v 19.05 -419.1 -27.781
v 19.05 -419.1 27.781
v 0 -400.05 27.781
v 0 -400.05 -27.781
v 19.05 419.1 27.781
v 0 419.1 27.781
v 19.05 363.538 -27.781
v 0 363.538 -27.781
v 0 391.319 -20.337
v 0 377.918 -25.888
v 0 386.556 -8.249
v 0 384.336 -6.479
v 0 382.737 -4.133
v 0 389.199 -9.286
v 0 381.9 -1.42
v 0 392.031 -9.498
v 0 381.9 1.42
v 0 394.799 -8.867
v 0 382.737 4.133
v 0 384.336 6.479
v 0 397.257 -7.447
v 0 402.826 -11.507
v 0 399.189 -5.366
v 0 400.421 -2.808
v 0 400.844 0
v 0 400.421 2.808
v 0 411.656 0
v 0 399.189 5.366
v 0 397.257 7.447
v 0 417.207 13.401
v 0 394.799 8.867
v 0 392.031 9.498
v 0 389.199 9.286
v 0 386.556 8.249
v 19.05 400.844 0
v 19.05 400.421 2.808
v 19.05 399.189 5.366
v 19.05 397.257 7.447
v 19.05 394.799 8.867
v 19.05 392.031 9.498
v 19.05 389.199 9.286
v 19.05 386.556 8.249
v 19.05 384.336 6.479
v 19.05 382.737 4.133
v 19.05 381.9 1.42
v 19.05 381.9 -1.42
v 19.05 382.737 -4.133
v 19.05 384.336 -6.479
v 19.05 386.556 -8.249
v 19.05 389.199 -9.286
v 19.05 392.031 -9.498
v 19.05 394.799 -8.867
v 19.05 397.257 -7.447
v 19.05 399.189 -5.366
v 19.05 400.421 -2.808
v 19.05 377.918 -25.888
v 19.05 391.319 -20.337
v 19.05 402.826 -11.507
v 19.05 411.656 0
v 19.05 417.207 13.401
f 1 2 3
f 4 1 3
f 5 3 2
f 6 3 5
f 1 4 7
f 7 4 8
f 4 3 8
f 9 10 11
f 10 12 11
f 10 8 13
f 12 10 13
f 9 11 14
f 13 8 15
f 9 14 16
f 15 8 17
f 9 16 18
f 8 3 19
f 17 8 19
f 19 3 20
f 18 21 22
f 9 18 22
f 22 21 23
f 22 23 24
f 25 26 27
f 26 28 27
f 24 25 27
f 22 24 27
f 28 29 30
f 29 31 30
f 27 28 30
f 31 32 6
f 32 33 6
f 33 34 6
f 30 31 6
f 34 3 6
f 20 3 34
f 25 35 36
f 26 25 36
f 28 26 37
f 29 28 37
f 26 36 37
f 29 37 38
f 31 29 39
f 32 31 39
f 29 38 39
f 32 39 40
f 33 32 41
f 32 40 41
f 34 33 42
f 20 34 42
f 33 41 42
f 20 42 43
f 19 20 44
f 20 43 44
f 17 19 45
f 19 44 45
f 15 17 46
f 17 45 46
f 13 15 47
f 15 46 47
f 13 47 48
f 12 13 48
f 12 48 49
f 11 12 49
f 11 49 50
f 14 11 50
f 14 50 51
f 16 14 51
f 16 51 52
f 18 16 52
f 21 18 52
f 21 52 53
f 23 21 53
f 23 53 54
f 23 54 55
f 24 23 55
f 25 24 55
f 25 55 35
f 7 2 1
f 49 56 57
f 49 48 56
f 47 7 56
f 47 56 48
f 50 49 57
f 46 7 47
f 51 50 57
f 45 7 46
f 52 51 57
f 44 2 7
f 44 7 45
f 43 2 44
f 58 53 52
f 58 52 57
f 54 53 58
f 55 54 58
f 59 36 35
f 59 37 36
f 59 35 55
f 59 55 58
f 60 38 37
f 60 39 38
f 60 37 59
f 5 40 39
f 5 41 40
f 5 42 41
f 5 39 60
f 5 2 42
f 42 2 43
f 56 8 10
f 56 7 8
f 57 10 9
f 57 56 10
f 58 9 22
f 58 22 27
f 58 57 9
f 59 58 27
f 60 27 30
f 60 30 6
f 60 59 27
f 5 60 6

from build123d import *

# Parameters (mm, degrees)
F0_W     = 838.2
F0_H     = 55.5625
F1_DEPTH = 19.05
F2_R     = 55.56249
F4_DEPTH = 55.5635
F5_R     = 9.525
F6_DEPTH = 25.4


# Not quite as in the source:
# - a fillet or chamfer is up to 0.001 mm smaller than in the source, because OpenCascade refuses the exact size


with BuildPart() as f1:
    # F0 (on Right) → F1 (new body)
    with BuildSketch(Plane.YZ):
        Rectangle(F0_W, F0_H)
    extrude(amount=F1_DEPTH)

    # F2 (radius 55.5625 in the source; OpenCascade refuses exactly that, so slightly less here)
    f2_edges = [f1.edges().sort_by_distance(p)[0] for p in [
        (9.525, 419.1, -27.78125),
    ]]
    fillet(f2_edges, radius=F2_R)

    # F3 (on face) → F4 (cut, through all)
    with BuildSketch(Plane.XY.offset(27.78125)):
        Polygon((0, -419.1), (19.05, -419.1), (0, -400.05), align=None)
    extrude(amount=-F4_DEPTH, mode=Mode.SUBTRACT)

    # F5 (on face) → F6 (cut)
    with BuildSketch(Plane.YZ.offset(19.05)):
        with Locations((391.31875, 0)):
            Circle(F5_R)
    extrude(amount=-F6_DEPTH, mode=Mode.SUBTRACT)


solid = f1.part
